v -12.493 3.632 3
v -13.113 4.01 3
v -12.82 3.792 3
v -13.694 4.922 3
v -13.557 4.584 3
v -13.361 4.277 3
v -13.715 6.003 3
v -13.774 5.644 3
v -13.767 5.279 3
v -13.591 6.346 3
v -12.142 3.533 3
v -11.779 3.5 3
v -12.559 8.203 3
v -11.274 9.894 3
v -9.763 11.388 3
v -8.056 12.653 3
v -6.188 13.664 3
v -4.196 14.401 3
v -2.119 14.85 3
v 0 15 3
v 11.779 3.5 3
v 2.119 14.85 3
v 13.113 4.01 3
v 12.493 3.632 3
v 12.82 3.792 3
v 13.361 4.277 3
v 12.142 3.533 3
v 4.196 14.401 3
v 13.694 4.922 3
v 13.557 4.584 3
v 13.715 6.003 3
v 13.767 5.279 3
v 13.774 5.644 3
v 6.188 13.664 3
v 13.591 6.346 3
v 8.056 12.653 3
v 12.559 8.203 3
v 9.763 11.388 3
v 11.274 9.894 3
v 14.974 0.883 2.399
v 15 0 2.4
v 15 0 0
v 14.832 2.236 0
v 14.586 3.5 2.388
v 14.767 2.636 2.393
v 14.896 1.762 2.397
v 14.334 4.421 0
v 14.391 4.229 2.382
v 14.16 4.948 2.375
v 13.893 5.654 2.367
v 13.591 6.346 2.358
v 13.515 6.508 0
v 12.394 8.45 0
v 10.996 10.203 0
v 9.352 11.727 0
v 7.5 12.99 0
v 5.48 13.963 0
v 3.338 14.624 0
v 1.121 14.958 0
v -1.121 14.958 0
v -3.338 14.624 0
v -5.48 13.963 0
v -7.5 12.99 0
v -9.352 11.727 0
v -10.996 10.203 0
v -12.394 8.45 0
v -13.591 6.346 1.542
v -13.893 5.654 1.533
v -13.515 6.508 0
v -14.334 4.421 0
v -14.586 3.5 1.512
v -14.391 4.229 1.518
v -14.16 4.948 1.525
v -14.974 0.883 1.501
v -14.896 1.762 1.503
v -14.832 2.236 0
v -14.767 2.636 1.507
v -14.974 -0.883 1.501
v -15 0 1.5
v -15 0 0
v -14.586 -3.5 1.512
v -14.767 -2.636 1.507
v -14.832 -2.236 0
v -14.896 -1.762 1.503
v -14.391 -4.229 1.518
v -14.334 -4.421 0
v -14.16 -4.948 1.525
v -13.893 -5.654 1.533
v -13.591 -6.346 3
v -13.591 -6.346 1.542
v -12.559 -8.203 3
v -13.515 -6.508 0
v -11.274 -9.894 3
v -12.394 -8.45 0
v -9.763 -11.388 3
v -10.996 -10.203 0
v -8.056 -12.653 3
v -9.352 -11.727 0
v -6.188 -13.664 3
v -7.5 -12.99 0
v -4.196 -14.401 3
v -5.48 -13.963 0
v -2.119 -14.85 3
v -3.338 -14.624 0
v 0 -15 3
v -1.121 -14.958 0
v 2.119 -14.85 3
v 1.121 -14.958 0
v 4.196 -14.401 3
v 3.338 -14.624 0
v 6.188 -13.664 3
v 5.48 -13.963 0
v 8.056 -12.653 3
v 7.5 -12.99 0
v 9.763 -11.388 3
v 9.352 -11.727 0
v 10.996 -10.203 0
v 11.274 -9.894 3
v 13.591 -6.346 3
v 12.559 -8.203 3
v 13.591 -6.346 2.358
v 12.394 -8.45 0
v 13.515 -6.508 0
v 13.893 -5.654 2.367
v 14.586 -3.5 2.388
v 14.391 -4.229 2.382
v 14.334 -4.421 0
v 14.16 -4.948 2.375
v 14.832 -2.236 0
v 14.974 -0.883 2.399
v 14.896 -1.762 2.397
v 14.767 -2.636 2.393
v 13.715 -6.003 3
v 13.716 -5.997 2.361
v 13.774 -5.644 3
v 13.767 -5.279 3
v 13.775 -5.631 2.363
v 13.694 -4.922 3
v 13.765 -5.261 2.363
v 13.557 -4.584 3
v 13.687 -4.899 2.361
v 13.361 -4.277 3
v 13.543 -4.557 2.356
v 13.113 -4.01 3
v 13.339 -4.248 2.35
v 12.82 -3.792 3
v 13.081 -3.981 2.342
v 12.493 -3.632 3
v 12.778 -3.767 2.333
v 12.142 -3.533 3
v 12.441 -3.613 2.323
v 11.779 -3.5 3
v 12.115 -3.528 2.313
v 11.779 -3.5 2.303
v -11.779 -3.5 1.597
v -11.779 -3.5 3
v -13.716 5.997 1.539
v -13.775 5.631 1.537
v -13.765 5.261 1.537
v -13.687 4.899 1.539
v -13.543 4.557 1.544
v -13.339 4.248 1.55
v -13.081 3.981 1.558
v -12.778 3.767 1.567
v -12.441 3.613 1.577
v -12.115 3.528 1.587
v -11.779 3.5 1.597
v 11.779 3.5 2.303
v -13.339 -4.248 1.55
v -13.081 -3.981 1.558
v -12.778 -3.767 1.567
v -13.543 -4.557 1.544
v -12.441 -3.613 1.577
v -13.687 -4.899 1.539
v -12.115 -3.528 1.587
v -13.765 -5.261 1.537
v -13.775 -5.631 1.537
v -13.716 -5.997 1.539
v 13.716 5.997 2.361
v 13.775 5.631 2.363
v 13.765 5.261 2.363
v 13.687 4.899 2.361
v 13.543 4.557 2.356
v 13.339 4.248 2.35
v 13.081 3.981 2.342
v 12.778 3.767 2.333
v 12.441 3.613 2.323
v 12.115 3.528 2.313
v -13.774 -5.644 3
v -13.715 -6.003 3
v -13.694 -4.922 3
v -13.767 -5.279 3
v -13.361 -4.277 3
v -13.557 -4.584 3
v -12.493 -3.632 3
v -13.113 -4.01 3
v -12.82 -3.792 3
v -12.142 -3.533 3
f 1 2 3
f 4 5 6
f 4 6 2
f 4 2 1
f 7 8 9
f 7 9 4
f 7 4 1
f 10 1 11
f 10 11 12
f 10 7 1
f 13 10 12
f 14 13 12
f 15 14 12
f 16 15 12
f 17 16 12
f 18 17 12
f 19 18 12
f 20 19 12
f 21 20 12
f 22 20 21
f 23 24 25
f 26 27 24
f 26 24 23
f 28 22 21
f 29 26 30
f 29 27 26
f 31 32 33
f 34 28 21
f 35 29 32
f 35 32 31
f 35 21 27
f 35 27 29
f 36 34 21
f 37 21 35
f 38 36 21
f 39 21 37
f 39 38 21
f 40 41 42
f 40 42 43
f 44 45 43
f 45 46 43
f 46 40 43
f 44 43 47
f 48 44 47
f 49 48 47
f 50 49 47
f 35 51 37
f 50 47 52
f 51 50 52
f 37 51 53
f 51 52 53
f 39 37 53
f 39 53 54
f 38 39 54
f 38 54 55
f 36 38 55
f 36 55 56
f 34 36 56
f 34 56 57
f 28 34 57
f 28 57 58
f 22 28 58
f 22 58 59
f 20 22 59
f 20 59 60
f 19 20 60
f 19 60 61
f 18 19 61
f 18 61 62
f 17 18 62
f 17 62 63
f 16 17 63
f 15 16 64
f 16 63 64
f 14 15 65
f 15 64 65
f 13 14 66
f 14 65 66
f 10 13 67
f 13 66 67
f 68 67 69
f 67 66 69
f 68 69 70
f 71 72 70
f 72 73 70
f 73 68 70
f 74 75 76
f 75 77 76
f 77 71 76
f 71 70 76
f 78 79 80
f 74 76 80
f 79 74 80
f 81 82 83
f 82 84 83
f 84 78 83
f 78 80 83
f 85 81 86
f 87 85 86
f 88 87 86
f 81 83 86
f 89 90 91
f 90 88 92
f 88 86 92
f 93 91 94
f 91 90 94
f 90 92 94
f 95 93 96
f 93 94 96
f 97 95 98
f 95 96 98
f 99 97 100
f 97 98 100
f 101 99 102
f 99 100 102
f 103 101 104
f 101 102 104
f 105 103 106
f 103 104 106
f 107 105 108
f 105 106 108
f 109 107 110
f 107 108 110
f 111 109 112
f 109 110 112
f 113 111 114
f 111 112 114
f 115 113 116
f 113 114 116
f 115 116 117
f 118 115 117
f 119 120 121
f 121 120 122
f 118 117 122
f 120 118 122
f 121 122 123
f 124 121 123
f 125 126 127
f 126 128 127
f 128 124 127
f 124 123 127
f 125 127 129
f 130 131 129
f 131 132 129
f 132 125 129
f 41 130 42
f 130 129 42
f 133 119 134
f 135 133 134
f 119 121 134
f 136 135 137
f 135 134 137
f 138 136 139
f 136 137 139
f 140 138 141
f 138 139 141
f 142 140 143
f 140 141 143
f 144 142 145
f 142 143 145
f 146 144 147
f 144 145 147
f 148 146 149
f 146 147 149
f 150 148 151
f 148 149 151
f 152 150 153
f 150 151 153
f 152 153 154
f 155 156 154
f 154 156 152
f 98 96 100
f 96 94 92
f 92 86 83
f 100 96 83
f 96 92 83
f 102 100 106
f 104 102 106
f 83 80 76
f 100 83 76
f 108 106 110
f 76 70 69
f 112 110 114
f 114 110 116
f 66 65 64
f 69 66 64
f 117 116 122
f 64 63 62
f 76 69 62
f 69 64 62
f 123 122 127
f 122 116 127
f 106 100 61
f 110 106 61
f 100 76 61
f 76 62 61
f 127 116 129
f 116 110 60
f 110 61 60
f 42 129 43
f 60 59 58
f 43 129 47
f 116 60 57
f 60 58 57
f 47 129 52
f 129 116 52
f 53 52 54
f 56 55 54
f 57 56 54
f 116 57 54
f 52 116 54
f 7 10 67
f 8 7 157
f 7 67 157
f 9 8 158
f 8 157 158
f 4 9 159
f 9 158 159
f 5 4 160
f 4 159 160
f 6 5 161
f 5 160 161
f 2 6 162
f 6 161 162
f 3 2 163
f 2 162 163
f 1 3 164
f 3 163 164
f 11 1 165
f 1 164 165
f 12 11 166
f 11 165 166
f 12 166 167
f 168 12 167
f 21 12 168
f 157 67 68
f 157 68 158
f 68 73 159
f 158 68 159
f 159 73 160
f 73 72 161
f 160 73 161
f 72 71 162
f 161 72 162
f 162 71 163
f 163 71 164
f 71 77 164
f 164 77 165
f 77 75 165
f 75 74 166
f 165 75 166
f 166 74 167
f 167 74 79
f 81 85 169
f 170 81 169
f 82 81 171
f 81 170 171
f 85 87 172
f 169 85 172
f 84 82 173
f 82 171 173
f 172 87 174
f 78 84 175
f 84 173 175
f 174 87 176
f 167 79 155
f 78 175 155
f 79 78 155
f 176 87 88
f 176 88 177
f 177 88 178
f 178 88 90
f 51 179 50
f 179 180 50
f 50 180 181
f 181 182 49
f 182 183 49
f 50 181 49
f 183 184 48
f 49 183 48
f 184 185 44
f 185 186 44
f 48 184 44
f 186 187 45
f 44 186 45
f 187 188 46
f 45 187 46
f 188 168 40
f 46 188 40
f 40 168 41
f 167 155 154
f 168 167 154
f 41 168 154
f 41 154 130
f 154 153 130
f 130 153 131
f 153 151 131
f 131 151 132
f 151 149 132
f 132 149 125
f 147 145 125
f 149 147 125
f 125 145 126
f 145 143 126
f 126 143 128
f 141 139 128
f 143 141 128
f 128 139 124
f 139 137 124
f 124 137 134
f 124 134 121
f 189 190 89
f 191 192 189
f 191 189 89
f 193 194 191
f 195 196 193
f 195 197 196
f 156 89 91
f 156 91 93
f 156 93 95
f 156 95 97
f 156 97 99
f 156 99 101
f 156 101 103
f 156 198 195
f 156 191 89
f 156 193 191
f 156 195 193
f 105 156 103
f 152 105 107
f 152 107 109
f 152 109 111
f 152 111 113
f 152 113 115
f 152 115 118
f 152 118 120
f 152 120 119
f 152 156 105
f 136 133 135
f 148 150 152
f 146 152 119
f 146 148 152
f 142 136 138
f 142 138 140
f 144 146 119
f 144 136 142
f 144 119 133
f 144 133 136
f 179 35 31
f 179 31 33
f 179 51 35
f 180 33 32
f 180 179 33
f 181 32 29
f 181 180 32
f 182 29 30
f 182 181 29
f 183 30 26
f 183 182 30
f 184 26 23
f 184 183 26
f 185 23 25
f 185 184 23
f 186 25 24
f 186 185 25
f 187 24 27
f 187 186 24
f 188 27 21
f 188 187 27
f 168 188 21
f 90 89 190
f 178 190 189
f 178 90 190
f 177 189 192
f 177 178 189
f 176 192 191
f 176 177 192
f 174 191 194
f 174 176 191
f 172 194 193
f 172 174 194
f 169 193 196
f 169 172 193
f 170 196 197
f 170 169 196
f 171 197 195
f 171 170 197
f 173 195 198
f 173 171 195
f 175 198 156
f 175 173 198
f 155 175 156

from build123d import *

# Parameters (mm, degrees)
F0_R     = 15
F1_DEPTH = 3
F3_DEPTH = 3.5
F4_R     = 2


with BuildPart() as f1:
    # F0 (on Top) → F1 (new body)
    with BuildSketch(Plane.XY):
        Circle(F0_R)
    extrude(amount=F1_DEPTH)

    # F2 (on Front) → F3 (cut, symmetric)
    with BuildSketch(Plane.XZ):
        Polygon((15, 3), (-15, 3), (-15, 1.5), (15, 2.4), align=None)
    extrude(amount=F3_DEPTH, both=True, mode=Mode.SUBTRACT)

    # F4
    f4_edges = [f1.edges().sort_by_distance(p)[0] for p in [
        (-14.585952, 3.5, 2.256211),
        (14.585952, 3.5, 2.693789),
        (14.585952, -3.5, 2.693789),
        (-14.585952, -3.5, 2.256211),
    ]]
    fillet(f4_edges, radius=F4_R)


solid = f1.part
